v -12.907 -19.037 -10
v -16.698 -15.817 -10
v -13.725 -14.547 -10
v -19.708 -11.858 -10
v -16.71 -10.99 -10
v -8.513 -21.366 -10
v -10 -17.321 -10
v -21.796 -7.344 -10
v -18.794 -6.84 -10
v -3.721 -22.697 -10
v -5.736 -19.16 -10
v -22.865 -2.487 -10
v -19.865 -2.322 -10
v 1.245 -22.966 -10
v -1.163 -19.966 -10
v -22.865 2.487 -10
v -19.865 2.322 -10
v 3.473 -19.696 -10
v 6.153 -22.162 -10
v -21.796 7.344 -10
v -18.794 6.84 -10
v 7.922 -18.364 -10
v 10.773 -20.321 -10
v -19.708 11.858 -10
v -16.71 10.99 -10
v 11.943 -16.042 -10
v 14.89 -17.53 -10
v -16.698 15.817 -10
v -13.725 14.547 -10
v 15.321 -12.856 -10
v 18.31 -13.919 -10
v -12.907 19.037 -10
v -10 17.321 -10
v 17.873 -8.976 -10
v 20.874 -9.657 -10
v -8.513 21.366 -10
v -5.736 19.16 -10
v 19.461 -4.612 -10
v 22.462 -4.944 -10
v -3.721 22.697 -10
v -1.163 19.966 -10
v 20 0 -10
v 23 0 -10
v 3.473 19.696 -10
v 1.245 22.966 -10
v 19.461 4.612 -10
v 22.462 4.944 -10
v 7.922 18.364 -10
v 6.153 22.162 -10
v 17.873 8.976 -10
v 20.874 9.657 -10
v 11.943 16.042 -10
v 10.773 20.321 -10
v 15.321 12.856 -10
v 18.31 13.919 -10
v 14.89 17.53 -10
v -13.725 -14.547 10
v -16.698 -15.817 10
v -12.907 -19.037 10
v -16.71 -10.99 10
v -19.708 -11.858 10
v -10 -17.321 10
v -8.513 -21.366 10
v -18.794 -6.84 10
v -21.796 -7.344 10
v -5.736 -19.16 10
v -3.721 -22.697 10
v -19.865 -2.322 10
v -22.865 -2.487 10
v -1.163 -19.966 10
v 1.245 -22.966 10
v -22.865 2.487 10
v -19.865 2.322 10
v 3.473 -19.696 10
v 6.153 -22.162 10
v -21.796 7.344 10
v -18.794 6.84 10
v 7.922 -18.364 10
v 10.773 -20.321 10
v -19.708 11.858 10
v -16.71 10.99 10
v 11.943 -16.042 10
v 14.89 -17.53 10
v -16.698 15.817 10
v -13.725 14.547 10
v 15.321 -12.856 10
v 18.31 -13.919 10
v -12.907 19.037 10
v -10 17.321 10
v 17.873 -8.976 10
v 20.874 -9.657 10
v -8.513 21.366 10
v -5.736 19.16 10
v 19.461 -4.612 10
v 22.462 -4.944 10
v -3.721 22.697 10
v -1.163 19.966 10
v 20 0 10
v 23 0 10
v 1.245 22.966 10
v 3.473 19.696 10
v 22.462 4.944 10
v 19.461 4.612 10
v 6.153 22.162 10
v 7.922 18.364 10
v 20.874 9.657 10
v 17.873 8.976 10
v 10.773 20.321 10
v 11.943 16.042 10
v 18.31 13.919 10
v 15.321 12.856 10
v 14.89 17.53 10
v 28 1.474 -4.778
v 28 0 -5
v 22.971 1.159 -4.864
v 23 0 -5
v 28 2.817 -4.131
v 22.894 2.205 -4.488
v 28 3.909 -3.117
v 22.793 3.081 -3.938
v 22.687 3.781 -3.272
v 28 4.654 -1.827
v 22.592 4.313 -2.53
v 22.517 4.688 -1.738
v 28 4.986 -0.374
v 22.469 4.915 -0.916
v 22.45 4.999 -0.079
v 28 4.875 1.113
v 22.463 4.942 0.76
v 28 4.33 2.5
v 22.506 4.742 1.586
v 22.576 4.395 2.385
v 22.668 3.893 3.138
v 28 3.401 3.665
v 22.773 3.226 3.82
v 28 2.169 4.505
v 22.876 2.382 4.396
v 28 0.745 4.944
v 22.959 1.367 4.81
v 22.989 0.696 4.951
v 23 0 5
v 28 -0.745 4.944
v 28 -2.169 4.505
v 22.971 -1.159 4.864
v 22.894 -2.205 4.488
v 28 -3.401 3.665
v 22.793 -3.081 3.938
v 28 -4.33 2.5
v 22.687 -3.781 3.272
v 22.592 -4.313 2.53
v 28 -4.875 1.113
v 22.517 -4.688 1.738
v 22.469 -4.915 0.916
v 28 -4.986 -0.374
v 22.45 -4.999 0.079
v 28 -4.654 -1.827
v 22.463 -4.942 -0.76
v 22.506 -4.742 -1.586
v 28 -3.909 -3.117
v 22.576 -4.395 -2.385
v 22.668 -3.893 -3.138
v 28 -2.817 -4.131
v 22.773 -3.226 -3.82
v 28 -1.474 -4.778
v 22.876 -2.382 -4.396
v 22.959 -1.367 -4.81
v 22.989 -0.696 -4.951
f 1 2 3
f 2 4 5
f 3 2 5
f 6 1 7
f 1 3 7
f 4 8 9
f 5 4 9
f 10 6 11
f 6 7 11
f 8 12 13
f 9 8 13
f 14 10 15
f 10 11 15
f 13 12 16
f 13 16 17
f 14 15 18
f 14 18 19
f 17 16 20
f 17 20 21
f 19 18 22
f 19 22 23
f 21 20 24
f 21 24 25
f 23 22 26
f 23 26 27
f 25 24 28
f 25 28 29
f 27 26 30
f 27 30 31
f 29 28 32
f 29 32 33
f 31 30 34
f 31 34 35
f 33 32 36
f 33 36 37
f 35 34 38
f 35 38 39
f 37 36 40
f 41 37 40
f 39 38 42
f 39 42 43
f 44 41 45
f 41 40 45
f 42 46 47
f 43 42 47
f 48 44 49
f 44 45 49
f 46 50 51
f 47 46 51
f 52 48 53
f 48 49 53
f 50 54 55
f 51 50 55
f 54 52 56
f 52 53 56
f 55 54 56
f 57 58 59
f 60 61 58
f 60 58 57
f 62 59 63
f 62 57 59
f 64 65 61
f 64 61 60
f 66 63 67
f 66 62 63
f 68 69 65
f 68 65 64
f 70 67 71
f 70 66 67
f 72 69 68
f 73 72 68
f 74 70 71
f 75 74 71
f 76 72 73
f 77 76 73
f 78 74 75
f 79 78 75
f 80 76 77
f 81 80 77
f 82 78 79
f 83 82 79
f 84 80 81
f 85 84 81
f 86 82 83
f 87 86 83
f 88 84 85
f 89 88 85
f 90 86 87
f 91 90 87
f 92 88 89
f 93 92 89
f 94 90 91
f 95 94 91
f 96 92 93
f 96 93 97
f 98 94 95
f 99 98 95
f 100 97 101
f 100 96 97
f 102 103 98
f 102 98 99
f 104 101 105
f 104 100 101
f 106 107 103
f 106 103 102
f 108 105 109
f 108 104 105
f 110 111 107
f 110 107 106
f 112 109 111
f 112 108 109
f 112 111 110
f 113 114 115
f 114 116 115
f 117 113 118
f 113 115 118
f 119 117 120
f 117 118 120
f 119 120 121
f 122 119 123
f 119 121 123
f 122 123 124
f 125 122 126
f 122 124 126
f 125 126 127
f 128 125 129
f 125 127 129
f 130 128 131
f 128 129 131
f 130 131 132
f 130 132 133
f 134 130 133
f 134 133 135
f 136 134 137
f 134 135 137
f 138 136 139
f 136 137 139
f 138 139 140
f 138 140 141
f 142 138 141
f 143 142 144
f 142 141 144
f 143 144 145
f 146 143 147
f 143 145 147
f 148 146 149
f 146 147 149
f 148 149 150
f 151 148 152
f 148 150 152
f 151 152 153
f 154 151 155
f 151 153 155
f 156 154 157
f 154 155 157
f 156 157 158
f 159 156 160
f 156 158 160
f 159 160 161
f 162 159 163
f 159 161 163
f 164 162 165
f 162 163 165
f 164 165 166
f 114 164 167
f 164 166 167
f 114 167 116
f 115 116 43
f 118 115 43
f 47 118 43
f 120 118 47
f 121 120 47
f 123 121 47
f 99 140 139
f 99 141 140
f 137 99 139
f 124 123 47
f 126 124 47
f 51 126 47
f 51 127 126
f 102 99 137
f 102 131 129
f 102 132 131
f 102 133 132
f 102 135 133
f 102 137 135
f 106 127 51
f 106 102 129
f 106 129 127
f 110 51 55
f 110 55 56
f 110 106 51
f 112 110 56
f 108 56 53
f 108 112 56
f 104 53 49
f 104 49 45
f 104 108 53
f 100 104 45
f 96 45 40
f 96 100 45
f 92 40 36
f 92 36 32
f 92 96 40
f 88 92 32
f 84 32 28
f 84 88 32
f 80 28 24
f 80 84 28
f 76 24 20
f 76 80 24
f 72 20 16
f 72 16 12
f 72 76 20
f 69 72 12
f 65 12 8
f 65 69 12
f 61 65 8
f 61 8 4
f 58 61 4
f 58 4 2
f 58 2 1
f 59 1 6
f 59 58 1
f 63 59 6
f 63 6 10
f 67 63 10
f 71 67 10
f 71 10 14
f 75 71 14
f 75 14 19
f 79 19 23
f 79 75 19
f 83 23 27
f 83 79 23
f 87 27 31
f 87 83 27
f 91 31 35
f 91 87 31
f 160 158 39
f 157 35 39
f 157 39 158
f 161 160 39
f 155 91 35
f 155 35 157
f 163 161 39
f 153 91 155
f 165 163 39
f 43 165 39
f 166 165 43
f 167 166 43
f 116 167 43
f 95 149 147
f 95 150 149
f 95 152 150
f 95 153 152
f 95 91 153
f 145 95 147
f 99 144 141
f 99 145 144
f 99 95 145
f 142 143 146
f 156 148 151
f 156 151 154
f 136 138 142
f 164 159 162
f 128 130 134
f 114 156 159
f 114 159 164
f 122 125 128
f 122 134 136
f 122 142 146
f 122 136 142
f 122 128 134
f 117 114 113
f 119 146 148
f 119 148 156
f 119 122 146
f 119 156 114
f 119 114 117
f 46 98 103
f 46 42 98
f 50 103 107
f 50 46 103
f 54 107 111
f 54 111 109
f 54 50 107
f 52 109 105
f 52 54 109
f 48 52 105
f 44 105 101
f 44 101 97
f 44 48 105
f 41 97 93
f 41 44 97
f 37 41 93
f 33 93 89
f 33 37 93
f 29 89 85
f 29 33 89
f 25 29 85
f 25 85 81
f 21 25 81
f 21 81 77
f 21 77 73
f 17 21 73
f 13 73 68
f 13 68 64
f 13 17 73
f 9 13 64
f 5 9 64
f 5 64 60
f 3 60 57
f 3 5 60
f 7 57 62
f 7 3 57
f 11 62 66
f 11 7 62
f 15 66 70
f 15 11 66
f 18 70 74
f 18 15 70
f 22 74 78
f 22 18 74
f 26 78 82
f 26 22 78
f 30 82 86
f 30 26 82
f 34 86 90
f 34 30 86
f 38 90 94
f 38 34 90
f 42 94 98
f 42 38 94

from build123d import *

# Parameters (mm, degrees)
ESQUISSE1_R                    = 23
ESQUISSE1_R_2                  = 20
BOSS_EXTRU_1_DEPTH             = 10
BOSS_EXTRU_2_REACH             = 54.393
BOSS_EXTRU_2_END_RADIUS        = 23
ESQUISSE2_R                    = 5
BOSS_EXTRU_2_DIRECTION_2_DEPTH = 5


with BuildPart() as part:
    # Esquisse1 → Boss.-Extru.1 (new, symmetric)
    with BuildSketch(Plane.XY):
        Circle(ESQUISSE1_R)
        Circle(ESQUISSE1_R_2, mode=Mode.SUBTRACT)
    extrude(amount=BOSS_EXTRU_1_DEPTH, both=True)

    # Boss.-Extru.2: up to this cylinder (the profile starts outside it)
    boss_extru_2_end = Plane(origin=(0, 0, 0), z_dir=(0, 0, -1)) * Cylinder(BOSS_EXTRU_2_END_RADIUS, 155.786, mode=Mode.PRIVATE)
    # Esquisse2 → Boss.-Extru.2 (add, up to the surface)
    with BuildSketch(Plane(origin=(23, 0, 0), x_dir=(0, 0, -1), z_dir=(1, 0, 0)), mode=Mode.PRIVATE) as boss_extru_2_sk1:
        Circle(ESQUISSE2_R)
    boss_extru_2_tool1 = extrude(boss_extru_2_sk1.sketch, amount=-BOSS_EXTRU_2_REACH, mode=Mode.PRIVATE) - boss_extru_2_end
    add(boss_extru_2_tool1.solids().sort_by_distance((23, 0, 0))[0])
    add(boss_extru_2_tool1.solids().sort_by_distance((23, 0, 0))[1])

    # Esquisse2 → Boss.-Extru.2 direction 2 (add)
    with BuildSketch(Plane(origin=(23, 0, 0), x_dir=(0, 0, -1), z_dir=(1, 0, 0))):
        Circle(ESQUISSE2_R)
    extrude(amount=BOSS_EXTRU_2_DIRECTION_2_DEPTH)


solid = part.part
